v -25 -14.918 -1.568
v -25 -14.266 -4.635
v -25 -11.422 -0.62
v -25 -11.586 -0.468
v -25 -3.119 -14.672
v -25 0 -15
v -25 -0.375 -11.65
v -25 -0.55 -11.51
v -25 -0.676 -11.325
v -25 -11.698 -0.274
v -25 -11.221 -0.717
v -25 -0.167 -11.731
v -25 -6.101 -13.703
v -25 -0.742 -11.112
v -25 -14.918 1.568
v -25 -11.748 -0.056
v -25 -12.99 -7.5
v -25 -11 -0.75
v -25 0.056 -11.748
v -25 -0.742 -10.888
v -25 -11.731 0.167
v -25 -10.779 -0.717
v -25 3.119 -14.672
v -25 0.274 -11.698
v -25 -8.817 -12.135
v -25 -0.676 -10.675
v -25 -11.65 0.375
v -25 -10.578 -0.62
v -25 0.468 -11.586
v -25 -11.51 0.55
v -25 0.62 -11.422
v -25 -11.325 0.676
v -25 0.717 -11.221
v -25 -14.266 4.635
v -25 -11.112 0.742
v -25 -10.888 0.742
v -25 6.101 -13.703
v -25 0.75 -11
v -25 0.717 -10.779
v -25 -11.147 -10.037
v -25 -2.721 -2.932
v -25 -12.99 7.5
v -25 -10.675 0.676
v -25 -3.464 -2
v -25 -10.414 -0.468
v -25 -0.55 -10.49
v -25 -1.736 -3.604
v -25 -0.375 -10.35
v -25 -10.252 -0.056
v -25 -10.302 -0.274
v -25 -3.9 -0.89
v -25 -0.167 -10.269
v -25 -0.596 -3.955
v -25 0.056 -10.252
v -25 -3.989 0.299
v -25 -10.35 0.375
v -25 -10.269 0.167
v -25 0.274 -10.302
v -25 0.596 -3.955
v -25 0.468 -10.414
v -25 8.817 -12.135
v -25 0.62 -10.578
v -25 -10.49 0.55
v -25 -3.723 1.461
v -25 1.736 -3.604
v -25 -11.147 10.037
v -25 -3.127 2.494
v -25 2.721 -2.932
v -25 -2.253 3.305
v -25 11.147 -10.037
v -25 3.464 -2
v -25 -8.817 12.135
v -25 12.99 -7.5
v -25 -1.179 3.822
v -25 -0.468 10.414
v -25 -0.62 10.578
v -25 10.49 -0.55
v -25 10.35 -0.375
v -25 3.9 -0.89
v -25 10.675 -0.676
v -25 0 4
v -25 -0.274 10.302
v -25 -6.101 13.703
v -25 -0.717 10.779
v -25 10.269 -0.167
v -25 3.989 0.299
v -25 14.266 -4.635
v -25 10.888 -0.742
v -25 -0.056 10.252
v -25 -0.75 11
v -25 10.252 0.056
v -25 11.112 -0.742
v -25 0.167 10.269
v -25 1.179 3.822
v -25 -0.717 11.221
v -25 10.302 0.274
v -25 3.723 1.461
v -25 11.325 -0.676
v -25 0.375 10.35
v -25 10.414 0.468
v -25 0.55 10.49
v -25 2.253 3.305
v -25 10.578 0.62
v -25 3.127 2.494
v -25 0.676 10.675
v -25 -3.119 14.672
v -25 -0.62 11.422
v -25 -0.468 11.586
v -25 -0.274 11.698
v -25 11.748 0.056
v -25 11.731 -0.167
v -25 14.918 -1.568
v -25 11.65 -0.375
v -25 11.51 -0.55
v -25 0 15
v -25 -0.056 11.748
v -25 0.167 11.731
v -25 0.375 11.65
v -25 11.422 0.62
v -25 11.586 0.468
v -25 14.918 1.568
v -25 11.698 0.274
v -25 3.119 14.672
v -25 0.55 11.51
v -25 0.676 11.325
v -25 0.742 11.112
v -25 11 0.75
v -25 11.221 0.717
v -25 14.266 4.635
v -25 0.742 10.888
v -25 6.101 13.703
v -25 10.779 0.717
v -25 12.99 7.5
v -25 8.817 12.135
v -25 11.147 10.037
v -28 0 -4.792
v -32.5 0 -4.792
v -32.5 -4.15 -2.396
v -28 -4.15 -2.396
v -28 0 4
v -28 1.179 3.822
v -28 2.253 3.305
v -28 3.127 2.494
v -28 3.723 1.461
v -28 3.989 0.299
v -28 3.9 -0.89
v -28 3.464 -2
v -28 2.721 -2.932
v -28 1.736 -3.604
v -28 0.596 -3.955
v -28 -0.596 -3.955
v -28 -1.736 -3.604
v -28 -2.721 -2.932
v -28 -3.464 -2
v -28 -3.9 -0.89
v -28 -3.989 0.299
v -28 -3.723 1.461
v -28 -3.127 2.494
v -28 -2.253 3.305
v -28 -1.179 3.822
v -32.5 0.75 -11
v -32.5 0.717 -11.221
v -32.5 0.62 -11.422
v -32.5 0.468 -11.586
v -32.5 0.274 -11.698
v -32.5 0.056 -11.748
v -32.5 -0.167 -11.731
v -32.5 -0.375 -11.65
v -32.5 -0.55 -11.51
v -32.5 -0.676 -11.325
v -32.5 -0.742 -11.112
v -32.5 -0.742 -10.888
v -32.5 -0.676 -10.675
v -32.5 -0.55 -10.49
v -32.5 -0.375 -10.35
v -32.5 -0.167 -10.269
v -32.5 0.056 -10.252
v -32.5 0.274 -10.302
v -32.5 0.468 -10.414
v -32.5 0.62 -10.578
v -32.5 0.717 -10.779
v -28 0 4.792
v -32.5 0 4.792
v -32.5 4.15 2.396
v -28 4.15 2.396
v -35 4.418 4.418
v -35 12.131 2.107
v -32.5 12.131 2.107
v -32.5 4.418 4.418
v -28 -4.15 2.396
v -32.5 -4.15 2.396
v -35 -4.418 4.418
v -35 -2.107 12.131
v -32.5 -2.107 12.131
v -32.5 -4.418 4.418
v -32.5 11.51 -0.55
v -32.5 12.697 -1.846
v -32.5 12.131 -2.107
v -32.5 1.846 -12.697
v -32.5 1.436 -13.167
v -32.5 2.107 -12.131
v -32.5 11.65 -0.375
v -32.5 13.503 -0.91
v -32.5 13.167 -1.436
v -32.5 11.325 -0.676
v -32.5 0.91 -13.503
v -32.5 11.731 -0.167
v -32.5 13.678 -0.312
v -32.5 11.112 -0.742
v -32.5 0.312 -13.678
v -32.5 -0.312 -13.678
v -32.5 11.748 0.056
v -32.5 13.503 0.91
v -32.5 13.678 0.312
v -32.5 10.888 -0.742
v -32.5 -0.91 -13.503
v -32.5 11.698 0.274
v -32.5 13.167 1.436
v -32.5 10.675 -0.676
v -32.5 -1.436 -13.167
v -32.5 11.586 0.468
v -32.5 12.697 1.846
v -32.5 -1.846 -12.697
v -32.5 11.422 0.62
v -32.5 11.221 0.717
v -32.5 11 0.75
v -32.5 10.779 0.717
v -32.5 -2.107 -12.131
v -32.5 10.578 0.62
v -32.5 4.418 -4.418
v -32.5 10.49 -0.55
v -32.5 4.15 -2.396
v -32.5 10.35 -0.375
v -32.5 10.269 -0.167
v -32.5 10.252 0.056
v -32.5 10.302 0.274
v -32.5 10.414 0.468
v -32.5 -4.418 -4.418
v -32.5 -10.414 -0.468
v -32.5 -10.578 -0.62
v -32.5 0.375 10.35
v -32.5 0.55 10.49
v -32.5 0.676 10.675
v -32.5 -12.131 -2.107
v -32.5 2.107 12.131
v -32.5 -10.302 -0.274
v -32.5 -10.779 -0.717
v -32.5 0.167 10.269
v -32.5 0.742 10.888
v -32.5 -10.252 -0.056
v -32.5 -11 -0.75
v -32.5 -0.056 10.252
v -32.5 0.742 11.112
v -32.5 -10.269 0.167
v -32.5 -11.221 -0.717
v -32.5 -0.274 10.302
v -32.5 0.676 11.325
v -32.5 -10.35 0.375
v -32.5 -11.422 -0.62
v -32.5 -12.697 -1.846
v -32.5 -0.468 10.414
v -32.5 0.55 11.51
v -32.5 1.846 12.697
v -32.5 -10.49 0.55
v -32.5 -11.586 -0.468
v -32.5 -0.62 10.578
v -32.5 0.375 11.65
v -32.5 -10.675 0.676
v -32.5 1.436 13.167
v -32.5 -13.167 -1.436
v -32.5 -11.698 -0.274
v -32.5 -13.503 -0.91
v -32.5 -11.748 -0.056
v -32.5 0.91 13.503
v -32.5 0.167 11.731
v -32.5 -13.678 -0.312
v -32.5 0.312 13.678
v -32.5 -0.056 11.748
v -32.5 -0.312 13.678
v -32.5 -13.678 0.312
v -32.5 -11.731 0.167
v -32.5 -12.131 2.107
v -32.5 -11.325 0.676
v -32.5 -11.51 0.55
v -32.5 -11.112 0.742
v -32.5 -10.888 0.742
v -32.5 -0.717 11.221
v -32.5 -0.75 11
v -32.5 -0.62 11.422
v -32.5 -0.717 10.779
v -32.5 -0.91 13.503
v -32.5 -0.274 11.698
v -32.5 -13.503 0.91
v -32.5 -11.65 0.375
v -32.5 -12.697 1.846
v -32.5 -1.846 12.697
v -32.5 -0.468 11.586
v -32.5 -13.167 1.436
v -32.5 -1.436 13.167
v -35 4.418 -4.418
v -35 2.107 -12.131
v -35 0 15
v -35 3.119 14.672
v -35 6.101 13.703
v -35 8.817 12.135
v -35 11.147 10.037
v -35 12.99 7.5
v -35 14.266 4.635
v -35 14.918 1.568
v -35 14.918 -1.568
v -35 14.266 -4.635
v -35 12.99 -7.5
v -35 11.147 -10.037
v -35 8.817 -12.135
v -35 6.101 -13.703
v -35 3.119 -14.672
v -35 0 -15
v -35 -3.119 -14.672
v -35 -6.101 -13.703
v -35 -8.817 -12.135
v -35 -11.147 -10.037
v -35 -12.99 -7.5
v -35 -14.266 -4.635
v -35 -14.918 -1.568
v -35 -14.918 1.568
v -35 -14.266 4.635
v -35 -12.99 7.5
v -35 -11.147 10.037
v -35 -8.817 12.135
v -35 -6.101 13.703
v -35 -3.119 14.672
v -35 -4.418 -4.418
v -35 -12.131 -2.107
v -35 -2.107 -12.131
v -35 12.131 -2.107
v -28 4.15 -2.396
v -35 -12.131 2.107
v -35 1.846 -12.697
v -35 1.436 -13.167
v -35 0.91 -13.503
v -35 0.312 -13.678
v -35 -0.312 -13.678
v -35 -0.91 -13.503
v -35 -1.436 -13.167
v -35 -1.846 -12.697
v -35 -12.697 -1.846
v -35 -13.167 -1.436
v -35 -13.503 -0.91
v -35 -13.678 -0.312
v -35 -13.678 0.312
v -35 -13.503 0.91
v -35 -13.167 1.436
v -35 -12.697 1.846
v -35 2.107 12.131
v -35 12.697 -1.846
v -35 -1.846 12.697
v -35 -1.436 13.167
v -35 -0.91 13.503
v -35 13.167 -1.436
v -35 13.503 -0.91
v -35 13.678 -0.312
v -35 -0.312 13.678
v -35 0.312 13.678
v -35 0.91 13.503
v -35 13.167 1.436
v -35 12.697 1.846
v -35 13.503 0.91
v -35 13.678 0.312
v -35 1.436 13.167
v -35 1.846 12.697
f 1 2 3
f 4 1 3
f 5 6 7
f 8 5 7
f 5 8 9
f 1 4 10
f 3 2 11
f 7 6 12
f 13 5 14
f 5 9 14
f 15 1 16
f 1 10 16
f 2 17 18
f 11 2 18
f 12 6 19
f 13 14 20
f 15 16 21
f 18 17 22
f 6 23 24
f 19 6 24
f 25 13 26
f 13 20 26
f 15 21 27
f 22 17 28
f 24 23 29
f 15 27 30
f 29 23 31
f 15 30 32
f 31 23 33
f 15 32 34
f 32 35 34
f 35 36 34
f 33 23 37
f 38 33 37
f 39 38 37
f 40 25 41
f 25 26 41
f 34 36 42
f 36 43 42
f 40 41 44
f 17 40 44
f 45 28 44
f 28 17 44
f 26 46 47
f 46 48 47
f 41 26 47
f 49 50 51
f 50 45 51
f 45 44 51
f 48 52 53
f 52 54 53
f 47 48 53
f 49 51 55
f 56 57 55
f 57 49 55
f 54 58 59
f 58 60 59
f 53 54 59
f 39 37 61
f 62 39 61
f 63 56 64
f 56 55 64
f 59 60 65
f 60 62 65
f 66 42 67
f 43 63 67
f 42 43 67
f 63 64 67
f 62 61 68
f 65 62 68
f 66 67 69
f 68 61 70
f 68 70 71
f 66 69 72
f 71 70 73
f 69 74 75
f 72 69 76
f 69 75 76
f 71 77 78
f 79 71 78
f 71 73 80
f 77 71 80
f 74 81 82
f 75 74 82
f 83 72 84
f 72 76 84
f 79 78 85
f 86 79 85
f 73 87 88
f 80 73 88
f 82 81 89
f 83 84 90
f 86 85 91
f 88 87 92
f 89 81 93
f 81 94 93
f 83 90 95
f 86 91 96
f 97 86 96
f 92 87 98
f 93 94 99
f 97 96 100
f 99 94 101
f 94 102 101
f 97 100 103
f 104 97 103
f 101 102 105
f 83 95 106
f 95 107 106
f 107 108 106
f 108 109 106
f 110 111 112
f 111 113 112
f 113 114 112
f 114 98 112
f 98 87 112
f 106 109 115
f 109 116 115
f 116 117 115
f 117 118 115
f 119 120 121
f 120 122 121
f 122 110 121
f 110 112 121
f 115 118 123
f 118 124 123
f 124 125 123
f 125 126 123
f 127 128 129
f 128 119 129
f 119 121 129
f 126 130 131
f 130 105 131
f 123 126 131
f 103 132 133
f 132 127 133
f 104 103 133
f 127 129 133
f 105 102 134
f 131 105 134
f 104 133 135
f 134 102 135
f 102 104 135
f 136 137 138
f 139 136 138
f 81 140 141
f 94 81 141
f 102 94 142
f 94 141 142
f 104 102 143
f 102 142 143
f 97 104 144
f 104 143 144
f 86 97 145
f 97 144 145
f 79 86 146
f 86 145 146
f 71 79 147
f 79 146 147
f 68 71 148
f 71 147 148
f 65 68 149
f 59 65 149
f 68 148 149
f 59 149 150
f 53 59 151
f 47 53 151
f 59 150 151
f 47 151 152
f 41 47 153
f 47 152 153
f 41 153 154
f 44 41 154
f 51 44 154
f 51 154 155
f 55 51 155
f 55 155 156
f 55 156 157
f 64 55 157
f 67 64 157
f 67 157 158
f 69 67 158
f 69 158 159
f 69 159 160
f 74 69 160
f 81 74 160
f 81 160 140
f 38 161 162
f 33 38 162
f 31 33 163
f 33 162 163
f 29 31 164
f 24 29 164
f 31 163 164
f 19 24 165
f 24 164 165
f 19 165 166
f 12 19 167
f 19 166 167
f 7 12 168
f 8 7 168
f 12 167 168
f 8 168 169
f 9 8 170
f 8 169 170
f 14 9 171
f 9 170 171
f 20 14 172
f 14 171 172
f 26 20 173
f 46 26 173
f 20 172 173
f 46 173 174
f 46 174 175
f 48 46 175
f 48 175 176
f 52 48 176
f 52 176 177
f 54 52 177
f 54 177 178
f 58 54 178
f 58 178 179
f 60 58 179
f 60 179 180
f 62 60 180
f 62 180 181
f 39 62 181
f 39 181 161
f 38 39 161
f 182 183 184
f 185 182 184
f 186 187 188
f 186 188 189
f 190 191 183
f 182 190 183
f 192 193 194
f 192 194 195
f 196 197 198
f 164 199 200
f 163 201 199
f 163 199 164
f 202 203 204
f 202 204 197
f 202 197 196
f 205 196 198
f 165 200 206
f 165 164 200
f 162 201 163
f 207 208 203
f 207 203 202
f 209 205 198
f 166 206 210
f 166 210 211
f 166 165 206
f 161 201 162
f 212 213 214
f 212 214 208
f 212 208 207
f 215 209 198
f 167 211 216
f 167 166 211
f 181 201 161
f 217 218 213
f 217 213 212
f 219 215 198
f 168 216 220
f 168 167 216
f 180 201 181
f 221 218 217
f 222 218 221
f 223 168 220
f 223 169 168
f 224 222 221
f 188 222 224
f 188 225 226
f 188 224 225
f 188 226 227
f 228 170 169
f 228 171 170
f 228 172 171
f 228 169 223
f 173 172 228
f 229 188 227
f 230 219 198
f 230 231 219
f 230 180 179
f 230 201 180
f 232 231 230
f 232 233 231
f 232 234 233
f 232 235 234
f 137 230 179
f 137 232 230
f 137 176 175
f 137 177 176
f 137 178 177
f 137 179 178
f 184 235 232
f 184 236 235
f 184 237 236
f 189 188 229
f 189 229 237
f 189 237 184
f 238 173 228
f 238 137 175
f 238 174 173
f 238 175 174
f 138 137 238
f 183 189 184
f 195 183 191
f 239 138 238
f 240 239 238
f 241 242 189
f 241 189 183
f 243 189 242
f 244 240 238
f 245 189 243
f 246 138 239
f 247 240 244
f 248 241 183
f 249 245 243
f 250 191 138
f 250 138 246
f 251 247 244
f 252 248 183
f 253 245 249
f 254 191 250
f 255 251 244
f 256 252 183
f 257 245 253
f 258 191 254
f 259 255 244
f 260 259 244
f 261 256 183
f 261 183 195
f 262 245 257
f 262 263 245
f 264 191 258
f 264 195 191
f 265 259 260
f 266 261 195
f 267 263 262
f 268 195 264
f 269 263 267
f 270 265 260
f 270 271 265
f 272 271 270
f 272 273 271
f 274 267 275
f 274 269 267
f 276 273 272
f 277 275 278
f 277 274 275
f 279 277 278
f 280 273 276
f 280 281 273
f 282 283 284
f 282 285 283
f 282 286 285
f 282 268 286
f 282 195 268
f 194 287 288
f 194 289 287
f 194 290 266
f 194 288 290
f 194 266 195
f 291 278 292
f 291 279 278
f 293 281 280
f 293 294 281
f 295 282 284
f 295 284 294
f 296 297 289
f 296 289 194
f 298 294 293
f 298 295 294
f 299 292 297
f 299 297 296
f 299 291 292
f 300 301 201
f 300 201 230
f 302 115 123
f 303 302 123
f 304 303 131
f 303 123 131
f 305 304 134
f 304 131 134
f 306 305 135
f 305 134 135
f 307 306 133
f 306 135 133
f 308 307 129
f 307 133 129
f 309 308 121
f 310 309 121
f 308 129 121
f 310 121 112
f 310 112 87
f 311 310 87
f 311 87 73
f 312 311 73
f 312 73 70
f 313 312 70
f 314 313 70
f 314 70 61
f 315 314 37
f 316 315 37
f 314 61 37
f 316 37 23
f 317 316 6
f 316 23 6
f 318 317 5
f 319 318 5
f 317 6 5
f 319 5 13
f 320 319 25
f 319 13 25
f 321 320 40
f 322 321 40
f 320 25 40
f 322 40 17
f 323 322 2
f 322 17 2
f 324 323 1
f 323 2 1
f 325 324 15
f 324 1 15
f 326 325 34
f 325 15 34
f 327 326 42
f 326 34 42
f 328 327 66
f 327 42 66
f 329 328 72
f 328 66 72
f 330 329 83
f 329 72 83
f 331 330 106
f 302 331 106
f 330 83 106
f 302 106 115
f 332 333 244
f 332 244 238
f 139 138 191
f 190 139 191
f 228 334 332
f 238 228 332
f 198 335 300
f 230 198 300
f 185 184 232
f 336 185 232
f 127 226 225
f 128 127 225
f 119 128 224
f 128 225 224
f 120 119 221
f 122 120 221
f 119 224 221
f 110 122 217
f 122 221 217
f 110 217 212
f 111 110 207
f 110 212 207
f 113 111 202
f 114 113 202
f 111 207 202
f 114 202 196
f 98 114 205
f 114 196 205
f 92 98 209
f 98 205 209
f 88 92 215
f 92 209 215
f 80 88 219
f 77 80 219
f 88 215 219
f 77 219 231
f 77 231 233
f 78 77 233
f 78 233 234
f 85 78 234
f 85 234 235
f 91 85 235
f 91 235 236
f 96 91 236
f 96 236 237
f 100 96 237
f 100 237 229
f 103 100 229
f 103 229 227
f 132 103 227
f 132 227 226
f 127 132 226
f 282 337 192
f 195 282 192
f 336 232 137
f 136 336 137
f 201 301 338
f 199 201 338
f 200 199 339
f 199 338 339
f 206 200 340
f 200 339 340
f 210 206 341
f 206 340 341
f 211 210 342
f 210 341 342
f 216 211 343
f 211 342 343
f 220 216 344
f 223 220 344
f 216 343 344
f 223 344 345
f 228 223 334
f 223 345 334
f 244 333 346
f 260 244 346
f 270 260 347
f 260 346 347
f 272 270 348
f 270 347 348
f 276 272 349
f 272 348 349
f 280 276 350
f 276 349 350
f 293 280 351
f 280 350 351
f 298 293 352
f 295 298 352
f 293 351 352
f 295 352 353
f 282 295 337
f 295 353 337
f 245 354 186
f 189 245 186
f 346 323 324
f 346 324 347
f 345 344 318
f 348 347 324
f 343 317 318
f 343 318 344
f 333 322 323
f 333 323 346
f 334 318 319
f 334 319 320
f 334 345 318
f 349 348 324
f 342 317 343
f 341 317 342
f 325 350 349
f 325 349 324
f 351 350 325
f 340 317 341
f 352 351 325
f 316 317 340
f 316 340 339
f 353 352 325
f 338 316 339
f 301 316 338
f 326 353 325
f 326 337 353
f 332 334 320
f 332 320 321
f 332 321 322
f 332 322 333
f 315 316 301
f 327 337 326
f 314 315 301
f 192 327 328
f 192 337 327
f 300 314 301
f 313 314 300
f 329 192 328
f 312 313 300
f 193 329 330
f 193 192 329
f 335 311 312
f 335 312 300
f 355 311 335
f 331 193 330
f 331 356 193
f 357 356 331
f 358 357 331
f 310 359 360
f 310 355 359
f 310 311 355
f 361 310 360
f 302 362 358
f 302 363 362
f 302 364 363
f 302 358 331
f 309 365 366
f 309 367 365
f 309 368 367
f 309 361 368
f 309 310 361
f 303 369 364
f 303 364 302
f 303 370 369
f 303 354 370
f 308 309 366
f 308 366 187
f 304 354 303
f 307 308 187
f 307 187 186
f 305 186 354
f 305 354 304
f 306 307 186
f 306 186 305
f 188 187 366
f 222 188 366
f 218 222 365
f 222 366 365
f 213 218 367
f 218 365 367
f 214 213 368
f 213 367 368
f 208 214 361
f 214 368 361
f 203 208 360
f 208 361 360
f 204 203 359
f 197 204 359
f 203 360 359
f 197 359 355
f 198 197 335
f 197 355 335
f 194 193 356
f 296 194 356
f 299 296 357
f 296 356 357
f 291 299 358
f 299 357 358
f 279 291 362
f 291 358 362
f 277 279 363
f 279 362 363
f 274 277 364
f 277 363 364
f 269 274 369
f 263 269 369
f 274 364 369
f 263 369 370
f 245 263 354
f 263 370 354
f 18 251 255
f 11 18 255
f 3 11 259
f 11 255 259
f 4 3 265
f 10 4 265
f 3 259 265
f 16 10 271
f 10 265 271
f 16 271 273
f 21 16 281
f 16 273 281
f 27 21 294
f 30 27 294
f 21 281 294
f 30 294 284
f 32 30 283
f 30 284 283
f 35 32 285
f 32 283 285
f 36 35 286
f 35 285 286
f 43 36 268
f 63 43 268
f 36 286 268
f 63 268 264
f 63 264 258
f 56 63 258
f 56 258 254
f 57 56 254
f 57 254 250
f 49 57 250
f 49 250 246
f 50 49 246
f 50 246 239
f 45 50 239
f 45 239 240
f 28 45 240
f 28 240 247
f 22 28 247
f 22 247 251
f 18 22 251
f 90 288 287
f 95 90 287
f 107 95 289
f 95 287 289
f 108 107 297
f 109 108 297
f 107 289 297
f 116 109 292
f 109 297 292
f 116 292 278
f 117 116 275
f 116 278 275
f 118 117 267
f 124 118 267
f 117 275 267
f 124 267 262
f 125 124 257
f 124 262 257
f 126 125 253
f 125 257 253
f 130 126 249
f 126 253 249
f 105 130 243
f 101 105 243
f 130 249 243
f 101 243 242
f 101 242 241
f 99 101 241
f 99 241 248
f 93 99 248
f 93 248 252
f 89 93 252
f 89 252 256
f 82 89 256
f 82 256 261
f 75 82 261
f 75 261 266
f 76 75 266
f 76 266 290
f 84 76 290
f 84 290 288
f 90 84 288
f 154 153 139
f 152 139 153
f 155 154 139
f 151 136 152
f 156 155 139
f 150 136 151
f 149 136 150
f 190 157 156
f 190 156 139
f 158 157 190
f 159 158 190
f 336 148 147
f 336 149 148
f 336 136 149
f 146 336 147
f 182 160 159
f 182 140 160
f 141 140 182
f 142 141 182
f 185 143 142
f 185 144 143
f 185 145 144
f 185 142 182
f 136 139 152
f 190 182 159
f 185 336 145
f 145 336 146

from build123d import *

# Parameters (mm, degrees)
SKETCH017_R             = 15
PAD009_DEPTH            = 10
POCKET003_DEPTH         = 2.5
POLARPATTERN003_COUNT   = 4
SKETCH014_R             = 0.75
HOLE001_DEPTH           = 25
POLARPATTERN002_COUNT   = 4
SKETCH015_R             = 4
POCKET004_DEPTH         = 7.501
POCKET005_DEPTH         = 4.5
BODY010_PLACEMENT_ANGLE = 90


with BuildPart() as part:
    # Sketch017 → Pad009 (new body)
    with BuildSketch(Plane.XY):
        Circle(SKETCH017_R)
    extrude(amount=PAD009_DEPTH)

    # Sketch016 (on Face3 of Pad009) → Pocket003 (cut)
    with BuildSketch(Plane.XY.offset(10)):
        with BuildLine():
            ThreePointArc((-5.26869, 1.578261), (0, -5.5), (5.26869, 1.578261))
            Line((2.107476, 12.131304), (5.26869, 1.578261))
            ThreePointArc((2.107476, 12.131304), (0, 13.7), (-2.107476, 12.131304))
            Line((-2.107476, 12.131304), (-5.26869, 1.578261))
        make_face()
    pocket003 = extrude(amount=-POCKET003_DEPTH, mode=Mode.SUBTRACT)

    # PolarPattern003: Pocket003 ×4 about axis
    polarpattern003_axis = Axis((0, 0, 10), (0, 0, 1))
    for i in range(1, POLARPATTERN003_COUNT):
        add(pocket003.rotate(polarpattern003_axis, i * 360 / POLARPATTERN003_COUNT), mode=Mode.SUBTRACT)

    # Sketch014 (on Face21 of PolarPattern003) → Hole001 (cut)
    with BuildSketch(Plane.XY.offset(7.5)):
        with Locations((0, 11)):
            Circle(SKETCH014_R)
    hole001 = extrude(amount=-HOLE001_DEPTH, mode=Mode.SUBTRACT)

    # PolarPattern002: Hole001 ×4 about axis
    polarpattern002_axis = Axis((0, 0, 7.5), (0, 0, 1))
    for i in range(1, POLARPATTERN002_COUNT):
        add(hole001.rotate(polarpattern002_axis, i * 360 / POLARPATTERN002_COUNT), mode=Mode.SUBTRACT)

    # Sketch015 (on Face25 of PolarPattern002) → Pocket004 (cut, through all)
    with BuildSketch(Plane.XY.offset(7.5)):
        Circle(SKETCH015_R)
    extrude(amount=-POCKET004_DEPTH, mode=Mode.SUBTRACT)

    # Sketch018 (on Face24 of Pocket004) → Pocket005 (cut)
    with BuildSketch(Plane.XY.offset(7.5)):
        Polygon((-2.396004, 4.15), (-4.792007, 0), (-2.396004, -4.15), (2.396004, -4.15), (4.792007, 0), (2.396004, 4.15), align=None)
    extrude(amount=-POCKET005_DEPTH, mode=Mode.SUBTRACT)


with BuildPart() as part_1:
    # Body010 placement: moved
    add(part.part.moved(Location((-25, 0, 0))).rotate(Axis((-25, 0, 0), (0, -1, 0)), BODY010_PLACEMENT_ANGLE))


solid = part_1.part
